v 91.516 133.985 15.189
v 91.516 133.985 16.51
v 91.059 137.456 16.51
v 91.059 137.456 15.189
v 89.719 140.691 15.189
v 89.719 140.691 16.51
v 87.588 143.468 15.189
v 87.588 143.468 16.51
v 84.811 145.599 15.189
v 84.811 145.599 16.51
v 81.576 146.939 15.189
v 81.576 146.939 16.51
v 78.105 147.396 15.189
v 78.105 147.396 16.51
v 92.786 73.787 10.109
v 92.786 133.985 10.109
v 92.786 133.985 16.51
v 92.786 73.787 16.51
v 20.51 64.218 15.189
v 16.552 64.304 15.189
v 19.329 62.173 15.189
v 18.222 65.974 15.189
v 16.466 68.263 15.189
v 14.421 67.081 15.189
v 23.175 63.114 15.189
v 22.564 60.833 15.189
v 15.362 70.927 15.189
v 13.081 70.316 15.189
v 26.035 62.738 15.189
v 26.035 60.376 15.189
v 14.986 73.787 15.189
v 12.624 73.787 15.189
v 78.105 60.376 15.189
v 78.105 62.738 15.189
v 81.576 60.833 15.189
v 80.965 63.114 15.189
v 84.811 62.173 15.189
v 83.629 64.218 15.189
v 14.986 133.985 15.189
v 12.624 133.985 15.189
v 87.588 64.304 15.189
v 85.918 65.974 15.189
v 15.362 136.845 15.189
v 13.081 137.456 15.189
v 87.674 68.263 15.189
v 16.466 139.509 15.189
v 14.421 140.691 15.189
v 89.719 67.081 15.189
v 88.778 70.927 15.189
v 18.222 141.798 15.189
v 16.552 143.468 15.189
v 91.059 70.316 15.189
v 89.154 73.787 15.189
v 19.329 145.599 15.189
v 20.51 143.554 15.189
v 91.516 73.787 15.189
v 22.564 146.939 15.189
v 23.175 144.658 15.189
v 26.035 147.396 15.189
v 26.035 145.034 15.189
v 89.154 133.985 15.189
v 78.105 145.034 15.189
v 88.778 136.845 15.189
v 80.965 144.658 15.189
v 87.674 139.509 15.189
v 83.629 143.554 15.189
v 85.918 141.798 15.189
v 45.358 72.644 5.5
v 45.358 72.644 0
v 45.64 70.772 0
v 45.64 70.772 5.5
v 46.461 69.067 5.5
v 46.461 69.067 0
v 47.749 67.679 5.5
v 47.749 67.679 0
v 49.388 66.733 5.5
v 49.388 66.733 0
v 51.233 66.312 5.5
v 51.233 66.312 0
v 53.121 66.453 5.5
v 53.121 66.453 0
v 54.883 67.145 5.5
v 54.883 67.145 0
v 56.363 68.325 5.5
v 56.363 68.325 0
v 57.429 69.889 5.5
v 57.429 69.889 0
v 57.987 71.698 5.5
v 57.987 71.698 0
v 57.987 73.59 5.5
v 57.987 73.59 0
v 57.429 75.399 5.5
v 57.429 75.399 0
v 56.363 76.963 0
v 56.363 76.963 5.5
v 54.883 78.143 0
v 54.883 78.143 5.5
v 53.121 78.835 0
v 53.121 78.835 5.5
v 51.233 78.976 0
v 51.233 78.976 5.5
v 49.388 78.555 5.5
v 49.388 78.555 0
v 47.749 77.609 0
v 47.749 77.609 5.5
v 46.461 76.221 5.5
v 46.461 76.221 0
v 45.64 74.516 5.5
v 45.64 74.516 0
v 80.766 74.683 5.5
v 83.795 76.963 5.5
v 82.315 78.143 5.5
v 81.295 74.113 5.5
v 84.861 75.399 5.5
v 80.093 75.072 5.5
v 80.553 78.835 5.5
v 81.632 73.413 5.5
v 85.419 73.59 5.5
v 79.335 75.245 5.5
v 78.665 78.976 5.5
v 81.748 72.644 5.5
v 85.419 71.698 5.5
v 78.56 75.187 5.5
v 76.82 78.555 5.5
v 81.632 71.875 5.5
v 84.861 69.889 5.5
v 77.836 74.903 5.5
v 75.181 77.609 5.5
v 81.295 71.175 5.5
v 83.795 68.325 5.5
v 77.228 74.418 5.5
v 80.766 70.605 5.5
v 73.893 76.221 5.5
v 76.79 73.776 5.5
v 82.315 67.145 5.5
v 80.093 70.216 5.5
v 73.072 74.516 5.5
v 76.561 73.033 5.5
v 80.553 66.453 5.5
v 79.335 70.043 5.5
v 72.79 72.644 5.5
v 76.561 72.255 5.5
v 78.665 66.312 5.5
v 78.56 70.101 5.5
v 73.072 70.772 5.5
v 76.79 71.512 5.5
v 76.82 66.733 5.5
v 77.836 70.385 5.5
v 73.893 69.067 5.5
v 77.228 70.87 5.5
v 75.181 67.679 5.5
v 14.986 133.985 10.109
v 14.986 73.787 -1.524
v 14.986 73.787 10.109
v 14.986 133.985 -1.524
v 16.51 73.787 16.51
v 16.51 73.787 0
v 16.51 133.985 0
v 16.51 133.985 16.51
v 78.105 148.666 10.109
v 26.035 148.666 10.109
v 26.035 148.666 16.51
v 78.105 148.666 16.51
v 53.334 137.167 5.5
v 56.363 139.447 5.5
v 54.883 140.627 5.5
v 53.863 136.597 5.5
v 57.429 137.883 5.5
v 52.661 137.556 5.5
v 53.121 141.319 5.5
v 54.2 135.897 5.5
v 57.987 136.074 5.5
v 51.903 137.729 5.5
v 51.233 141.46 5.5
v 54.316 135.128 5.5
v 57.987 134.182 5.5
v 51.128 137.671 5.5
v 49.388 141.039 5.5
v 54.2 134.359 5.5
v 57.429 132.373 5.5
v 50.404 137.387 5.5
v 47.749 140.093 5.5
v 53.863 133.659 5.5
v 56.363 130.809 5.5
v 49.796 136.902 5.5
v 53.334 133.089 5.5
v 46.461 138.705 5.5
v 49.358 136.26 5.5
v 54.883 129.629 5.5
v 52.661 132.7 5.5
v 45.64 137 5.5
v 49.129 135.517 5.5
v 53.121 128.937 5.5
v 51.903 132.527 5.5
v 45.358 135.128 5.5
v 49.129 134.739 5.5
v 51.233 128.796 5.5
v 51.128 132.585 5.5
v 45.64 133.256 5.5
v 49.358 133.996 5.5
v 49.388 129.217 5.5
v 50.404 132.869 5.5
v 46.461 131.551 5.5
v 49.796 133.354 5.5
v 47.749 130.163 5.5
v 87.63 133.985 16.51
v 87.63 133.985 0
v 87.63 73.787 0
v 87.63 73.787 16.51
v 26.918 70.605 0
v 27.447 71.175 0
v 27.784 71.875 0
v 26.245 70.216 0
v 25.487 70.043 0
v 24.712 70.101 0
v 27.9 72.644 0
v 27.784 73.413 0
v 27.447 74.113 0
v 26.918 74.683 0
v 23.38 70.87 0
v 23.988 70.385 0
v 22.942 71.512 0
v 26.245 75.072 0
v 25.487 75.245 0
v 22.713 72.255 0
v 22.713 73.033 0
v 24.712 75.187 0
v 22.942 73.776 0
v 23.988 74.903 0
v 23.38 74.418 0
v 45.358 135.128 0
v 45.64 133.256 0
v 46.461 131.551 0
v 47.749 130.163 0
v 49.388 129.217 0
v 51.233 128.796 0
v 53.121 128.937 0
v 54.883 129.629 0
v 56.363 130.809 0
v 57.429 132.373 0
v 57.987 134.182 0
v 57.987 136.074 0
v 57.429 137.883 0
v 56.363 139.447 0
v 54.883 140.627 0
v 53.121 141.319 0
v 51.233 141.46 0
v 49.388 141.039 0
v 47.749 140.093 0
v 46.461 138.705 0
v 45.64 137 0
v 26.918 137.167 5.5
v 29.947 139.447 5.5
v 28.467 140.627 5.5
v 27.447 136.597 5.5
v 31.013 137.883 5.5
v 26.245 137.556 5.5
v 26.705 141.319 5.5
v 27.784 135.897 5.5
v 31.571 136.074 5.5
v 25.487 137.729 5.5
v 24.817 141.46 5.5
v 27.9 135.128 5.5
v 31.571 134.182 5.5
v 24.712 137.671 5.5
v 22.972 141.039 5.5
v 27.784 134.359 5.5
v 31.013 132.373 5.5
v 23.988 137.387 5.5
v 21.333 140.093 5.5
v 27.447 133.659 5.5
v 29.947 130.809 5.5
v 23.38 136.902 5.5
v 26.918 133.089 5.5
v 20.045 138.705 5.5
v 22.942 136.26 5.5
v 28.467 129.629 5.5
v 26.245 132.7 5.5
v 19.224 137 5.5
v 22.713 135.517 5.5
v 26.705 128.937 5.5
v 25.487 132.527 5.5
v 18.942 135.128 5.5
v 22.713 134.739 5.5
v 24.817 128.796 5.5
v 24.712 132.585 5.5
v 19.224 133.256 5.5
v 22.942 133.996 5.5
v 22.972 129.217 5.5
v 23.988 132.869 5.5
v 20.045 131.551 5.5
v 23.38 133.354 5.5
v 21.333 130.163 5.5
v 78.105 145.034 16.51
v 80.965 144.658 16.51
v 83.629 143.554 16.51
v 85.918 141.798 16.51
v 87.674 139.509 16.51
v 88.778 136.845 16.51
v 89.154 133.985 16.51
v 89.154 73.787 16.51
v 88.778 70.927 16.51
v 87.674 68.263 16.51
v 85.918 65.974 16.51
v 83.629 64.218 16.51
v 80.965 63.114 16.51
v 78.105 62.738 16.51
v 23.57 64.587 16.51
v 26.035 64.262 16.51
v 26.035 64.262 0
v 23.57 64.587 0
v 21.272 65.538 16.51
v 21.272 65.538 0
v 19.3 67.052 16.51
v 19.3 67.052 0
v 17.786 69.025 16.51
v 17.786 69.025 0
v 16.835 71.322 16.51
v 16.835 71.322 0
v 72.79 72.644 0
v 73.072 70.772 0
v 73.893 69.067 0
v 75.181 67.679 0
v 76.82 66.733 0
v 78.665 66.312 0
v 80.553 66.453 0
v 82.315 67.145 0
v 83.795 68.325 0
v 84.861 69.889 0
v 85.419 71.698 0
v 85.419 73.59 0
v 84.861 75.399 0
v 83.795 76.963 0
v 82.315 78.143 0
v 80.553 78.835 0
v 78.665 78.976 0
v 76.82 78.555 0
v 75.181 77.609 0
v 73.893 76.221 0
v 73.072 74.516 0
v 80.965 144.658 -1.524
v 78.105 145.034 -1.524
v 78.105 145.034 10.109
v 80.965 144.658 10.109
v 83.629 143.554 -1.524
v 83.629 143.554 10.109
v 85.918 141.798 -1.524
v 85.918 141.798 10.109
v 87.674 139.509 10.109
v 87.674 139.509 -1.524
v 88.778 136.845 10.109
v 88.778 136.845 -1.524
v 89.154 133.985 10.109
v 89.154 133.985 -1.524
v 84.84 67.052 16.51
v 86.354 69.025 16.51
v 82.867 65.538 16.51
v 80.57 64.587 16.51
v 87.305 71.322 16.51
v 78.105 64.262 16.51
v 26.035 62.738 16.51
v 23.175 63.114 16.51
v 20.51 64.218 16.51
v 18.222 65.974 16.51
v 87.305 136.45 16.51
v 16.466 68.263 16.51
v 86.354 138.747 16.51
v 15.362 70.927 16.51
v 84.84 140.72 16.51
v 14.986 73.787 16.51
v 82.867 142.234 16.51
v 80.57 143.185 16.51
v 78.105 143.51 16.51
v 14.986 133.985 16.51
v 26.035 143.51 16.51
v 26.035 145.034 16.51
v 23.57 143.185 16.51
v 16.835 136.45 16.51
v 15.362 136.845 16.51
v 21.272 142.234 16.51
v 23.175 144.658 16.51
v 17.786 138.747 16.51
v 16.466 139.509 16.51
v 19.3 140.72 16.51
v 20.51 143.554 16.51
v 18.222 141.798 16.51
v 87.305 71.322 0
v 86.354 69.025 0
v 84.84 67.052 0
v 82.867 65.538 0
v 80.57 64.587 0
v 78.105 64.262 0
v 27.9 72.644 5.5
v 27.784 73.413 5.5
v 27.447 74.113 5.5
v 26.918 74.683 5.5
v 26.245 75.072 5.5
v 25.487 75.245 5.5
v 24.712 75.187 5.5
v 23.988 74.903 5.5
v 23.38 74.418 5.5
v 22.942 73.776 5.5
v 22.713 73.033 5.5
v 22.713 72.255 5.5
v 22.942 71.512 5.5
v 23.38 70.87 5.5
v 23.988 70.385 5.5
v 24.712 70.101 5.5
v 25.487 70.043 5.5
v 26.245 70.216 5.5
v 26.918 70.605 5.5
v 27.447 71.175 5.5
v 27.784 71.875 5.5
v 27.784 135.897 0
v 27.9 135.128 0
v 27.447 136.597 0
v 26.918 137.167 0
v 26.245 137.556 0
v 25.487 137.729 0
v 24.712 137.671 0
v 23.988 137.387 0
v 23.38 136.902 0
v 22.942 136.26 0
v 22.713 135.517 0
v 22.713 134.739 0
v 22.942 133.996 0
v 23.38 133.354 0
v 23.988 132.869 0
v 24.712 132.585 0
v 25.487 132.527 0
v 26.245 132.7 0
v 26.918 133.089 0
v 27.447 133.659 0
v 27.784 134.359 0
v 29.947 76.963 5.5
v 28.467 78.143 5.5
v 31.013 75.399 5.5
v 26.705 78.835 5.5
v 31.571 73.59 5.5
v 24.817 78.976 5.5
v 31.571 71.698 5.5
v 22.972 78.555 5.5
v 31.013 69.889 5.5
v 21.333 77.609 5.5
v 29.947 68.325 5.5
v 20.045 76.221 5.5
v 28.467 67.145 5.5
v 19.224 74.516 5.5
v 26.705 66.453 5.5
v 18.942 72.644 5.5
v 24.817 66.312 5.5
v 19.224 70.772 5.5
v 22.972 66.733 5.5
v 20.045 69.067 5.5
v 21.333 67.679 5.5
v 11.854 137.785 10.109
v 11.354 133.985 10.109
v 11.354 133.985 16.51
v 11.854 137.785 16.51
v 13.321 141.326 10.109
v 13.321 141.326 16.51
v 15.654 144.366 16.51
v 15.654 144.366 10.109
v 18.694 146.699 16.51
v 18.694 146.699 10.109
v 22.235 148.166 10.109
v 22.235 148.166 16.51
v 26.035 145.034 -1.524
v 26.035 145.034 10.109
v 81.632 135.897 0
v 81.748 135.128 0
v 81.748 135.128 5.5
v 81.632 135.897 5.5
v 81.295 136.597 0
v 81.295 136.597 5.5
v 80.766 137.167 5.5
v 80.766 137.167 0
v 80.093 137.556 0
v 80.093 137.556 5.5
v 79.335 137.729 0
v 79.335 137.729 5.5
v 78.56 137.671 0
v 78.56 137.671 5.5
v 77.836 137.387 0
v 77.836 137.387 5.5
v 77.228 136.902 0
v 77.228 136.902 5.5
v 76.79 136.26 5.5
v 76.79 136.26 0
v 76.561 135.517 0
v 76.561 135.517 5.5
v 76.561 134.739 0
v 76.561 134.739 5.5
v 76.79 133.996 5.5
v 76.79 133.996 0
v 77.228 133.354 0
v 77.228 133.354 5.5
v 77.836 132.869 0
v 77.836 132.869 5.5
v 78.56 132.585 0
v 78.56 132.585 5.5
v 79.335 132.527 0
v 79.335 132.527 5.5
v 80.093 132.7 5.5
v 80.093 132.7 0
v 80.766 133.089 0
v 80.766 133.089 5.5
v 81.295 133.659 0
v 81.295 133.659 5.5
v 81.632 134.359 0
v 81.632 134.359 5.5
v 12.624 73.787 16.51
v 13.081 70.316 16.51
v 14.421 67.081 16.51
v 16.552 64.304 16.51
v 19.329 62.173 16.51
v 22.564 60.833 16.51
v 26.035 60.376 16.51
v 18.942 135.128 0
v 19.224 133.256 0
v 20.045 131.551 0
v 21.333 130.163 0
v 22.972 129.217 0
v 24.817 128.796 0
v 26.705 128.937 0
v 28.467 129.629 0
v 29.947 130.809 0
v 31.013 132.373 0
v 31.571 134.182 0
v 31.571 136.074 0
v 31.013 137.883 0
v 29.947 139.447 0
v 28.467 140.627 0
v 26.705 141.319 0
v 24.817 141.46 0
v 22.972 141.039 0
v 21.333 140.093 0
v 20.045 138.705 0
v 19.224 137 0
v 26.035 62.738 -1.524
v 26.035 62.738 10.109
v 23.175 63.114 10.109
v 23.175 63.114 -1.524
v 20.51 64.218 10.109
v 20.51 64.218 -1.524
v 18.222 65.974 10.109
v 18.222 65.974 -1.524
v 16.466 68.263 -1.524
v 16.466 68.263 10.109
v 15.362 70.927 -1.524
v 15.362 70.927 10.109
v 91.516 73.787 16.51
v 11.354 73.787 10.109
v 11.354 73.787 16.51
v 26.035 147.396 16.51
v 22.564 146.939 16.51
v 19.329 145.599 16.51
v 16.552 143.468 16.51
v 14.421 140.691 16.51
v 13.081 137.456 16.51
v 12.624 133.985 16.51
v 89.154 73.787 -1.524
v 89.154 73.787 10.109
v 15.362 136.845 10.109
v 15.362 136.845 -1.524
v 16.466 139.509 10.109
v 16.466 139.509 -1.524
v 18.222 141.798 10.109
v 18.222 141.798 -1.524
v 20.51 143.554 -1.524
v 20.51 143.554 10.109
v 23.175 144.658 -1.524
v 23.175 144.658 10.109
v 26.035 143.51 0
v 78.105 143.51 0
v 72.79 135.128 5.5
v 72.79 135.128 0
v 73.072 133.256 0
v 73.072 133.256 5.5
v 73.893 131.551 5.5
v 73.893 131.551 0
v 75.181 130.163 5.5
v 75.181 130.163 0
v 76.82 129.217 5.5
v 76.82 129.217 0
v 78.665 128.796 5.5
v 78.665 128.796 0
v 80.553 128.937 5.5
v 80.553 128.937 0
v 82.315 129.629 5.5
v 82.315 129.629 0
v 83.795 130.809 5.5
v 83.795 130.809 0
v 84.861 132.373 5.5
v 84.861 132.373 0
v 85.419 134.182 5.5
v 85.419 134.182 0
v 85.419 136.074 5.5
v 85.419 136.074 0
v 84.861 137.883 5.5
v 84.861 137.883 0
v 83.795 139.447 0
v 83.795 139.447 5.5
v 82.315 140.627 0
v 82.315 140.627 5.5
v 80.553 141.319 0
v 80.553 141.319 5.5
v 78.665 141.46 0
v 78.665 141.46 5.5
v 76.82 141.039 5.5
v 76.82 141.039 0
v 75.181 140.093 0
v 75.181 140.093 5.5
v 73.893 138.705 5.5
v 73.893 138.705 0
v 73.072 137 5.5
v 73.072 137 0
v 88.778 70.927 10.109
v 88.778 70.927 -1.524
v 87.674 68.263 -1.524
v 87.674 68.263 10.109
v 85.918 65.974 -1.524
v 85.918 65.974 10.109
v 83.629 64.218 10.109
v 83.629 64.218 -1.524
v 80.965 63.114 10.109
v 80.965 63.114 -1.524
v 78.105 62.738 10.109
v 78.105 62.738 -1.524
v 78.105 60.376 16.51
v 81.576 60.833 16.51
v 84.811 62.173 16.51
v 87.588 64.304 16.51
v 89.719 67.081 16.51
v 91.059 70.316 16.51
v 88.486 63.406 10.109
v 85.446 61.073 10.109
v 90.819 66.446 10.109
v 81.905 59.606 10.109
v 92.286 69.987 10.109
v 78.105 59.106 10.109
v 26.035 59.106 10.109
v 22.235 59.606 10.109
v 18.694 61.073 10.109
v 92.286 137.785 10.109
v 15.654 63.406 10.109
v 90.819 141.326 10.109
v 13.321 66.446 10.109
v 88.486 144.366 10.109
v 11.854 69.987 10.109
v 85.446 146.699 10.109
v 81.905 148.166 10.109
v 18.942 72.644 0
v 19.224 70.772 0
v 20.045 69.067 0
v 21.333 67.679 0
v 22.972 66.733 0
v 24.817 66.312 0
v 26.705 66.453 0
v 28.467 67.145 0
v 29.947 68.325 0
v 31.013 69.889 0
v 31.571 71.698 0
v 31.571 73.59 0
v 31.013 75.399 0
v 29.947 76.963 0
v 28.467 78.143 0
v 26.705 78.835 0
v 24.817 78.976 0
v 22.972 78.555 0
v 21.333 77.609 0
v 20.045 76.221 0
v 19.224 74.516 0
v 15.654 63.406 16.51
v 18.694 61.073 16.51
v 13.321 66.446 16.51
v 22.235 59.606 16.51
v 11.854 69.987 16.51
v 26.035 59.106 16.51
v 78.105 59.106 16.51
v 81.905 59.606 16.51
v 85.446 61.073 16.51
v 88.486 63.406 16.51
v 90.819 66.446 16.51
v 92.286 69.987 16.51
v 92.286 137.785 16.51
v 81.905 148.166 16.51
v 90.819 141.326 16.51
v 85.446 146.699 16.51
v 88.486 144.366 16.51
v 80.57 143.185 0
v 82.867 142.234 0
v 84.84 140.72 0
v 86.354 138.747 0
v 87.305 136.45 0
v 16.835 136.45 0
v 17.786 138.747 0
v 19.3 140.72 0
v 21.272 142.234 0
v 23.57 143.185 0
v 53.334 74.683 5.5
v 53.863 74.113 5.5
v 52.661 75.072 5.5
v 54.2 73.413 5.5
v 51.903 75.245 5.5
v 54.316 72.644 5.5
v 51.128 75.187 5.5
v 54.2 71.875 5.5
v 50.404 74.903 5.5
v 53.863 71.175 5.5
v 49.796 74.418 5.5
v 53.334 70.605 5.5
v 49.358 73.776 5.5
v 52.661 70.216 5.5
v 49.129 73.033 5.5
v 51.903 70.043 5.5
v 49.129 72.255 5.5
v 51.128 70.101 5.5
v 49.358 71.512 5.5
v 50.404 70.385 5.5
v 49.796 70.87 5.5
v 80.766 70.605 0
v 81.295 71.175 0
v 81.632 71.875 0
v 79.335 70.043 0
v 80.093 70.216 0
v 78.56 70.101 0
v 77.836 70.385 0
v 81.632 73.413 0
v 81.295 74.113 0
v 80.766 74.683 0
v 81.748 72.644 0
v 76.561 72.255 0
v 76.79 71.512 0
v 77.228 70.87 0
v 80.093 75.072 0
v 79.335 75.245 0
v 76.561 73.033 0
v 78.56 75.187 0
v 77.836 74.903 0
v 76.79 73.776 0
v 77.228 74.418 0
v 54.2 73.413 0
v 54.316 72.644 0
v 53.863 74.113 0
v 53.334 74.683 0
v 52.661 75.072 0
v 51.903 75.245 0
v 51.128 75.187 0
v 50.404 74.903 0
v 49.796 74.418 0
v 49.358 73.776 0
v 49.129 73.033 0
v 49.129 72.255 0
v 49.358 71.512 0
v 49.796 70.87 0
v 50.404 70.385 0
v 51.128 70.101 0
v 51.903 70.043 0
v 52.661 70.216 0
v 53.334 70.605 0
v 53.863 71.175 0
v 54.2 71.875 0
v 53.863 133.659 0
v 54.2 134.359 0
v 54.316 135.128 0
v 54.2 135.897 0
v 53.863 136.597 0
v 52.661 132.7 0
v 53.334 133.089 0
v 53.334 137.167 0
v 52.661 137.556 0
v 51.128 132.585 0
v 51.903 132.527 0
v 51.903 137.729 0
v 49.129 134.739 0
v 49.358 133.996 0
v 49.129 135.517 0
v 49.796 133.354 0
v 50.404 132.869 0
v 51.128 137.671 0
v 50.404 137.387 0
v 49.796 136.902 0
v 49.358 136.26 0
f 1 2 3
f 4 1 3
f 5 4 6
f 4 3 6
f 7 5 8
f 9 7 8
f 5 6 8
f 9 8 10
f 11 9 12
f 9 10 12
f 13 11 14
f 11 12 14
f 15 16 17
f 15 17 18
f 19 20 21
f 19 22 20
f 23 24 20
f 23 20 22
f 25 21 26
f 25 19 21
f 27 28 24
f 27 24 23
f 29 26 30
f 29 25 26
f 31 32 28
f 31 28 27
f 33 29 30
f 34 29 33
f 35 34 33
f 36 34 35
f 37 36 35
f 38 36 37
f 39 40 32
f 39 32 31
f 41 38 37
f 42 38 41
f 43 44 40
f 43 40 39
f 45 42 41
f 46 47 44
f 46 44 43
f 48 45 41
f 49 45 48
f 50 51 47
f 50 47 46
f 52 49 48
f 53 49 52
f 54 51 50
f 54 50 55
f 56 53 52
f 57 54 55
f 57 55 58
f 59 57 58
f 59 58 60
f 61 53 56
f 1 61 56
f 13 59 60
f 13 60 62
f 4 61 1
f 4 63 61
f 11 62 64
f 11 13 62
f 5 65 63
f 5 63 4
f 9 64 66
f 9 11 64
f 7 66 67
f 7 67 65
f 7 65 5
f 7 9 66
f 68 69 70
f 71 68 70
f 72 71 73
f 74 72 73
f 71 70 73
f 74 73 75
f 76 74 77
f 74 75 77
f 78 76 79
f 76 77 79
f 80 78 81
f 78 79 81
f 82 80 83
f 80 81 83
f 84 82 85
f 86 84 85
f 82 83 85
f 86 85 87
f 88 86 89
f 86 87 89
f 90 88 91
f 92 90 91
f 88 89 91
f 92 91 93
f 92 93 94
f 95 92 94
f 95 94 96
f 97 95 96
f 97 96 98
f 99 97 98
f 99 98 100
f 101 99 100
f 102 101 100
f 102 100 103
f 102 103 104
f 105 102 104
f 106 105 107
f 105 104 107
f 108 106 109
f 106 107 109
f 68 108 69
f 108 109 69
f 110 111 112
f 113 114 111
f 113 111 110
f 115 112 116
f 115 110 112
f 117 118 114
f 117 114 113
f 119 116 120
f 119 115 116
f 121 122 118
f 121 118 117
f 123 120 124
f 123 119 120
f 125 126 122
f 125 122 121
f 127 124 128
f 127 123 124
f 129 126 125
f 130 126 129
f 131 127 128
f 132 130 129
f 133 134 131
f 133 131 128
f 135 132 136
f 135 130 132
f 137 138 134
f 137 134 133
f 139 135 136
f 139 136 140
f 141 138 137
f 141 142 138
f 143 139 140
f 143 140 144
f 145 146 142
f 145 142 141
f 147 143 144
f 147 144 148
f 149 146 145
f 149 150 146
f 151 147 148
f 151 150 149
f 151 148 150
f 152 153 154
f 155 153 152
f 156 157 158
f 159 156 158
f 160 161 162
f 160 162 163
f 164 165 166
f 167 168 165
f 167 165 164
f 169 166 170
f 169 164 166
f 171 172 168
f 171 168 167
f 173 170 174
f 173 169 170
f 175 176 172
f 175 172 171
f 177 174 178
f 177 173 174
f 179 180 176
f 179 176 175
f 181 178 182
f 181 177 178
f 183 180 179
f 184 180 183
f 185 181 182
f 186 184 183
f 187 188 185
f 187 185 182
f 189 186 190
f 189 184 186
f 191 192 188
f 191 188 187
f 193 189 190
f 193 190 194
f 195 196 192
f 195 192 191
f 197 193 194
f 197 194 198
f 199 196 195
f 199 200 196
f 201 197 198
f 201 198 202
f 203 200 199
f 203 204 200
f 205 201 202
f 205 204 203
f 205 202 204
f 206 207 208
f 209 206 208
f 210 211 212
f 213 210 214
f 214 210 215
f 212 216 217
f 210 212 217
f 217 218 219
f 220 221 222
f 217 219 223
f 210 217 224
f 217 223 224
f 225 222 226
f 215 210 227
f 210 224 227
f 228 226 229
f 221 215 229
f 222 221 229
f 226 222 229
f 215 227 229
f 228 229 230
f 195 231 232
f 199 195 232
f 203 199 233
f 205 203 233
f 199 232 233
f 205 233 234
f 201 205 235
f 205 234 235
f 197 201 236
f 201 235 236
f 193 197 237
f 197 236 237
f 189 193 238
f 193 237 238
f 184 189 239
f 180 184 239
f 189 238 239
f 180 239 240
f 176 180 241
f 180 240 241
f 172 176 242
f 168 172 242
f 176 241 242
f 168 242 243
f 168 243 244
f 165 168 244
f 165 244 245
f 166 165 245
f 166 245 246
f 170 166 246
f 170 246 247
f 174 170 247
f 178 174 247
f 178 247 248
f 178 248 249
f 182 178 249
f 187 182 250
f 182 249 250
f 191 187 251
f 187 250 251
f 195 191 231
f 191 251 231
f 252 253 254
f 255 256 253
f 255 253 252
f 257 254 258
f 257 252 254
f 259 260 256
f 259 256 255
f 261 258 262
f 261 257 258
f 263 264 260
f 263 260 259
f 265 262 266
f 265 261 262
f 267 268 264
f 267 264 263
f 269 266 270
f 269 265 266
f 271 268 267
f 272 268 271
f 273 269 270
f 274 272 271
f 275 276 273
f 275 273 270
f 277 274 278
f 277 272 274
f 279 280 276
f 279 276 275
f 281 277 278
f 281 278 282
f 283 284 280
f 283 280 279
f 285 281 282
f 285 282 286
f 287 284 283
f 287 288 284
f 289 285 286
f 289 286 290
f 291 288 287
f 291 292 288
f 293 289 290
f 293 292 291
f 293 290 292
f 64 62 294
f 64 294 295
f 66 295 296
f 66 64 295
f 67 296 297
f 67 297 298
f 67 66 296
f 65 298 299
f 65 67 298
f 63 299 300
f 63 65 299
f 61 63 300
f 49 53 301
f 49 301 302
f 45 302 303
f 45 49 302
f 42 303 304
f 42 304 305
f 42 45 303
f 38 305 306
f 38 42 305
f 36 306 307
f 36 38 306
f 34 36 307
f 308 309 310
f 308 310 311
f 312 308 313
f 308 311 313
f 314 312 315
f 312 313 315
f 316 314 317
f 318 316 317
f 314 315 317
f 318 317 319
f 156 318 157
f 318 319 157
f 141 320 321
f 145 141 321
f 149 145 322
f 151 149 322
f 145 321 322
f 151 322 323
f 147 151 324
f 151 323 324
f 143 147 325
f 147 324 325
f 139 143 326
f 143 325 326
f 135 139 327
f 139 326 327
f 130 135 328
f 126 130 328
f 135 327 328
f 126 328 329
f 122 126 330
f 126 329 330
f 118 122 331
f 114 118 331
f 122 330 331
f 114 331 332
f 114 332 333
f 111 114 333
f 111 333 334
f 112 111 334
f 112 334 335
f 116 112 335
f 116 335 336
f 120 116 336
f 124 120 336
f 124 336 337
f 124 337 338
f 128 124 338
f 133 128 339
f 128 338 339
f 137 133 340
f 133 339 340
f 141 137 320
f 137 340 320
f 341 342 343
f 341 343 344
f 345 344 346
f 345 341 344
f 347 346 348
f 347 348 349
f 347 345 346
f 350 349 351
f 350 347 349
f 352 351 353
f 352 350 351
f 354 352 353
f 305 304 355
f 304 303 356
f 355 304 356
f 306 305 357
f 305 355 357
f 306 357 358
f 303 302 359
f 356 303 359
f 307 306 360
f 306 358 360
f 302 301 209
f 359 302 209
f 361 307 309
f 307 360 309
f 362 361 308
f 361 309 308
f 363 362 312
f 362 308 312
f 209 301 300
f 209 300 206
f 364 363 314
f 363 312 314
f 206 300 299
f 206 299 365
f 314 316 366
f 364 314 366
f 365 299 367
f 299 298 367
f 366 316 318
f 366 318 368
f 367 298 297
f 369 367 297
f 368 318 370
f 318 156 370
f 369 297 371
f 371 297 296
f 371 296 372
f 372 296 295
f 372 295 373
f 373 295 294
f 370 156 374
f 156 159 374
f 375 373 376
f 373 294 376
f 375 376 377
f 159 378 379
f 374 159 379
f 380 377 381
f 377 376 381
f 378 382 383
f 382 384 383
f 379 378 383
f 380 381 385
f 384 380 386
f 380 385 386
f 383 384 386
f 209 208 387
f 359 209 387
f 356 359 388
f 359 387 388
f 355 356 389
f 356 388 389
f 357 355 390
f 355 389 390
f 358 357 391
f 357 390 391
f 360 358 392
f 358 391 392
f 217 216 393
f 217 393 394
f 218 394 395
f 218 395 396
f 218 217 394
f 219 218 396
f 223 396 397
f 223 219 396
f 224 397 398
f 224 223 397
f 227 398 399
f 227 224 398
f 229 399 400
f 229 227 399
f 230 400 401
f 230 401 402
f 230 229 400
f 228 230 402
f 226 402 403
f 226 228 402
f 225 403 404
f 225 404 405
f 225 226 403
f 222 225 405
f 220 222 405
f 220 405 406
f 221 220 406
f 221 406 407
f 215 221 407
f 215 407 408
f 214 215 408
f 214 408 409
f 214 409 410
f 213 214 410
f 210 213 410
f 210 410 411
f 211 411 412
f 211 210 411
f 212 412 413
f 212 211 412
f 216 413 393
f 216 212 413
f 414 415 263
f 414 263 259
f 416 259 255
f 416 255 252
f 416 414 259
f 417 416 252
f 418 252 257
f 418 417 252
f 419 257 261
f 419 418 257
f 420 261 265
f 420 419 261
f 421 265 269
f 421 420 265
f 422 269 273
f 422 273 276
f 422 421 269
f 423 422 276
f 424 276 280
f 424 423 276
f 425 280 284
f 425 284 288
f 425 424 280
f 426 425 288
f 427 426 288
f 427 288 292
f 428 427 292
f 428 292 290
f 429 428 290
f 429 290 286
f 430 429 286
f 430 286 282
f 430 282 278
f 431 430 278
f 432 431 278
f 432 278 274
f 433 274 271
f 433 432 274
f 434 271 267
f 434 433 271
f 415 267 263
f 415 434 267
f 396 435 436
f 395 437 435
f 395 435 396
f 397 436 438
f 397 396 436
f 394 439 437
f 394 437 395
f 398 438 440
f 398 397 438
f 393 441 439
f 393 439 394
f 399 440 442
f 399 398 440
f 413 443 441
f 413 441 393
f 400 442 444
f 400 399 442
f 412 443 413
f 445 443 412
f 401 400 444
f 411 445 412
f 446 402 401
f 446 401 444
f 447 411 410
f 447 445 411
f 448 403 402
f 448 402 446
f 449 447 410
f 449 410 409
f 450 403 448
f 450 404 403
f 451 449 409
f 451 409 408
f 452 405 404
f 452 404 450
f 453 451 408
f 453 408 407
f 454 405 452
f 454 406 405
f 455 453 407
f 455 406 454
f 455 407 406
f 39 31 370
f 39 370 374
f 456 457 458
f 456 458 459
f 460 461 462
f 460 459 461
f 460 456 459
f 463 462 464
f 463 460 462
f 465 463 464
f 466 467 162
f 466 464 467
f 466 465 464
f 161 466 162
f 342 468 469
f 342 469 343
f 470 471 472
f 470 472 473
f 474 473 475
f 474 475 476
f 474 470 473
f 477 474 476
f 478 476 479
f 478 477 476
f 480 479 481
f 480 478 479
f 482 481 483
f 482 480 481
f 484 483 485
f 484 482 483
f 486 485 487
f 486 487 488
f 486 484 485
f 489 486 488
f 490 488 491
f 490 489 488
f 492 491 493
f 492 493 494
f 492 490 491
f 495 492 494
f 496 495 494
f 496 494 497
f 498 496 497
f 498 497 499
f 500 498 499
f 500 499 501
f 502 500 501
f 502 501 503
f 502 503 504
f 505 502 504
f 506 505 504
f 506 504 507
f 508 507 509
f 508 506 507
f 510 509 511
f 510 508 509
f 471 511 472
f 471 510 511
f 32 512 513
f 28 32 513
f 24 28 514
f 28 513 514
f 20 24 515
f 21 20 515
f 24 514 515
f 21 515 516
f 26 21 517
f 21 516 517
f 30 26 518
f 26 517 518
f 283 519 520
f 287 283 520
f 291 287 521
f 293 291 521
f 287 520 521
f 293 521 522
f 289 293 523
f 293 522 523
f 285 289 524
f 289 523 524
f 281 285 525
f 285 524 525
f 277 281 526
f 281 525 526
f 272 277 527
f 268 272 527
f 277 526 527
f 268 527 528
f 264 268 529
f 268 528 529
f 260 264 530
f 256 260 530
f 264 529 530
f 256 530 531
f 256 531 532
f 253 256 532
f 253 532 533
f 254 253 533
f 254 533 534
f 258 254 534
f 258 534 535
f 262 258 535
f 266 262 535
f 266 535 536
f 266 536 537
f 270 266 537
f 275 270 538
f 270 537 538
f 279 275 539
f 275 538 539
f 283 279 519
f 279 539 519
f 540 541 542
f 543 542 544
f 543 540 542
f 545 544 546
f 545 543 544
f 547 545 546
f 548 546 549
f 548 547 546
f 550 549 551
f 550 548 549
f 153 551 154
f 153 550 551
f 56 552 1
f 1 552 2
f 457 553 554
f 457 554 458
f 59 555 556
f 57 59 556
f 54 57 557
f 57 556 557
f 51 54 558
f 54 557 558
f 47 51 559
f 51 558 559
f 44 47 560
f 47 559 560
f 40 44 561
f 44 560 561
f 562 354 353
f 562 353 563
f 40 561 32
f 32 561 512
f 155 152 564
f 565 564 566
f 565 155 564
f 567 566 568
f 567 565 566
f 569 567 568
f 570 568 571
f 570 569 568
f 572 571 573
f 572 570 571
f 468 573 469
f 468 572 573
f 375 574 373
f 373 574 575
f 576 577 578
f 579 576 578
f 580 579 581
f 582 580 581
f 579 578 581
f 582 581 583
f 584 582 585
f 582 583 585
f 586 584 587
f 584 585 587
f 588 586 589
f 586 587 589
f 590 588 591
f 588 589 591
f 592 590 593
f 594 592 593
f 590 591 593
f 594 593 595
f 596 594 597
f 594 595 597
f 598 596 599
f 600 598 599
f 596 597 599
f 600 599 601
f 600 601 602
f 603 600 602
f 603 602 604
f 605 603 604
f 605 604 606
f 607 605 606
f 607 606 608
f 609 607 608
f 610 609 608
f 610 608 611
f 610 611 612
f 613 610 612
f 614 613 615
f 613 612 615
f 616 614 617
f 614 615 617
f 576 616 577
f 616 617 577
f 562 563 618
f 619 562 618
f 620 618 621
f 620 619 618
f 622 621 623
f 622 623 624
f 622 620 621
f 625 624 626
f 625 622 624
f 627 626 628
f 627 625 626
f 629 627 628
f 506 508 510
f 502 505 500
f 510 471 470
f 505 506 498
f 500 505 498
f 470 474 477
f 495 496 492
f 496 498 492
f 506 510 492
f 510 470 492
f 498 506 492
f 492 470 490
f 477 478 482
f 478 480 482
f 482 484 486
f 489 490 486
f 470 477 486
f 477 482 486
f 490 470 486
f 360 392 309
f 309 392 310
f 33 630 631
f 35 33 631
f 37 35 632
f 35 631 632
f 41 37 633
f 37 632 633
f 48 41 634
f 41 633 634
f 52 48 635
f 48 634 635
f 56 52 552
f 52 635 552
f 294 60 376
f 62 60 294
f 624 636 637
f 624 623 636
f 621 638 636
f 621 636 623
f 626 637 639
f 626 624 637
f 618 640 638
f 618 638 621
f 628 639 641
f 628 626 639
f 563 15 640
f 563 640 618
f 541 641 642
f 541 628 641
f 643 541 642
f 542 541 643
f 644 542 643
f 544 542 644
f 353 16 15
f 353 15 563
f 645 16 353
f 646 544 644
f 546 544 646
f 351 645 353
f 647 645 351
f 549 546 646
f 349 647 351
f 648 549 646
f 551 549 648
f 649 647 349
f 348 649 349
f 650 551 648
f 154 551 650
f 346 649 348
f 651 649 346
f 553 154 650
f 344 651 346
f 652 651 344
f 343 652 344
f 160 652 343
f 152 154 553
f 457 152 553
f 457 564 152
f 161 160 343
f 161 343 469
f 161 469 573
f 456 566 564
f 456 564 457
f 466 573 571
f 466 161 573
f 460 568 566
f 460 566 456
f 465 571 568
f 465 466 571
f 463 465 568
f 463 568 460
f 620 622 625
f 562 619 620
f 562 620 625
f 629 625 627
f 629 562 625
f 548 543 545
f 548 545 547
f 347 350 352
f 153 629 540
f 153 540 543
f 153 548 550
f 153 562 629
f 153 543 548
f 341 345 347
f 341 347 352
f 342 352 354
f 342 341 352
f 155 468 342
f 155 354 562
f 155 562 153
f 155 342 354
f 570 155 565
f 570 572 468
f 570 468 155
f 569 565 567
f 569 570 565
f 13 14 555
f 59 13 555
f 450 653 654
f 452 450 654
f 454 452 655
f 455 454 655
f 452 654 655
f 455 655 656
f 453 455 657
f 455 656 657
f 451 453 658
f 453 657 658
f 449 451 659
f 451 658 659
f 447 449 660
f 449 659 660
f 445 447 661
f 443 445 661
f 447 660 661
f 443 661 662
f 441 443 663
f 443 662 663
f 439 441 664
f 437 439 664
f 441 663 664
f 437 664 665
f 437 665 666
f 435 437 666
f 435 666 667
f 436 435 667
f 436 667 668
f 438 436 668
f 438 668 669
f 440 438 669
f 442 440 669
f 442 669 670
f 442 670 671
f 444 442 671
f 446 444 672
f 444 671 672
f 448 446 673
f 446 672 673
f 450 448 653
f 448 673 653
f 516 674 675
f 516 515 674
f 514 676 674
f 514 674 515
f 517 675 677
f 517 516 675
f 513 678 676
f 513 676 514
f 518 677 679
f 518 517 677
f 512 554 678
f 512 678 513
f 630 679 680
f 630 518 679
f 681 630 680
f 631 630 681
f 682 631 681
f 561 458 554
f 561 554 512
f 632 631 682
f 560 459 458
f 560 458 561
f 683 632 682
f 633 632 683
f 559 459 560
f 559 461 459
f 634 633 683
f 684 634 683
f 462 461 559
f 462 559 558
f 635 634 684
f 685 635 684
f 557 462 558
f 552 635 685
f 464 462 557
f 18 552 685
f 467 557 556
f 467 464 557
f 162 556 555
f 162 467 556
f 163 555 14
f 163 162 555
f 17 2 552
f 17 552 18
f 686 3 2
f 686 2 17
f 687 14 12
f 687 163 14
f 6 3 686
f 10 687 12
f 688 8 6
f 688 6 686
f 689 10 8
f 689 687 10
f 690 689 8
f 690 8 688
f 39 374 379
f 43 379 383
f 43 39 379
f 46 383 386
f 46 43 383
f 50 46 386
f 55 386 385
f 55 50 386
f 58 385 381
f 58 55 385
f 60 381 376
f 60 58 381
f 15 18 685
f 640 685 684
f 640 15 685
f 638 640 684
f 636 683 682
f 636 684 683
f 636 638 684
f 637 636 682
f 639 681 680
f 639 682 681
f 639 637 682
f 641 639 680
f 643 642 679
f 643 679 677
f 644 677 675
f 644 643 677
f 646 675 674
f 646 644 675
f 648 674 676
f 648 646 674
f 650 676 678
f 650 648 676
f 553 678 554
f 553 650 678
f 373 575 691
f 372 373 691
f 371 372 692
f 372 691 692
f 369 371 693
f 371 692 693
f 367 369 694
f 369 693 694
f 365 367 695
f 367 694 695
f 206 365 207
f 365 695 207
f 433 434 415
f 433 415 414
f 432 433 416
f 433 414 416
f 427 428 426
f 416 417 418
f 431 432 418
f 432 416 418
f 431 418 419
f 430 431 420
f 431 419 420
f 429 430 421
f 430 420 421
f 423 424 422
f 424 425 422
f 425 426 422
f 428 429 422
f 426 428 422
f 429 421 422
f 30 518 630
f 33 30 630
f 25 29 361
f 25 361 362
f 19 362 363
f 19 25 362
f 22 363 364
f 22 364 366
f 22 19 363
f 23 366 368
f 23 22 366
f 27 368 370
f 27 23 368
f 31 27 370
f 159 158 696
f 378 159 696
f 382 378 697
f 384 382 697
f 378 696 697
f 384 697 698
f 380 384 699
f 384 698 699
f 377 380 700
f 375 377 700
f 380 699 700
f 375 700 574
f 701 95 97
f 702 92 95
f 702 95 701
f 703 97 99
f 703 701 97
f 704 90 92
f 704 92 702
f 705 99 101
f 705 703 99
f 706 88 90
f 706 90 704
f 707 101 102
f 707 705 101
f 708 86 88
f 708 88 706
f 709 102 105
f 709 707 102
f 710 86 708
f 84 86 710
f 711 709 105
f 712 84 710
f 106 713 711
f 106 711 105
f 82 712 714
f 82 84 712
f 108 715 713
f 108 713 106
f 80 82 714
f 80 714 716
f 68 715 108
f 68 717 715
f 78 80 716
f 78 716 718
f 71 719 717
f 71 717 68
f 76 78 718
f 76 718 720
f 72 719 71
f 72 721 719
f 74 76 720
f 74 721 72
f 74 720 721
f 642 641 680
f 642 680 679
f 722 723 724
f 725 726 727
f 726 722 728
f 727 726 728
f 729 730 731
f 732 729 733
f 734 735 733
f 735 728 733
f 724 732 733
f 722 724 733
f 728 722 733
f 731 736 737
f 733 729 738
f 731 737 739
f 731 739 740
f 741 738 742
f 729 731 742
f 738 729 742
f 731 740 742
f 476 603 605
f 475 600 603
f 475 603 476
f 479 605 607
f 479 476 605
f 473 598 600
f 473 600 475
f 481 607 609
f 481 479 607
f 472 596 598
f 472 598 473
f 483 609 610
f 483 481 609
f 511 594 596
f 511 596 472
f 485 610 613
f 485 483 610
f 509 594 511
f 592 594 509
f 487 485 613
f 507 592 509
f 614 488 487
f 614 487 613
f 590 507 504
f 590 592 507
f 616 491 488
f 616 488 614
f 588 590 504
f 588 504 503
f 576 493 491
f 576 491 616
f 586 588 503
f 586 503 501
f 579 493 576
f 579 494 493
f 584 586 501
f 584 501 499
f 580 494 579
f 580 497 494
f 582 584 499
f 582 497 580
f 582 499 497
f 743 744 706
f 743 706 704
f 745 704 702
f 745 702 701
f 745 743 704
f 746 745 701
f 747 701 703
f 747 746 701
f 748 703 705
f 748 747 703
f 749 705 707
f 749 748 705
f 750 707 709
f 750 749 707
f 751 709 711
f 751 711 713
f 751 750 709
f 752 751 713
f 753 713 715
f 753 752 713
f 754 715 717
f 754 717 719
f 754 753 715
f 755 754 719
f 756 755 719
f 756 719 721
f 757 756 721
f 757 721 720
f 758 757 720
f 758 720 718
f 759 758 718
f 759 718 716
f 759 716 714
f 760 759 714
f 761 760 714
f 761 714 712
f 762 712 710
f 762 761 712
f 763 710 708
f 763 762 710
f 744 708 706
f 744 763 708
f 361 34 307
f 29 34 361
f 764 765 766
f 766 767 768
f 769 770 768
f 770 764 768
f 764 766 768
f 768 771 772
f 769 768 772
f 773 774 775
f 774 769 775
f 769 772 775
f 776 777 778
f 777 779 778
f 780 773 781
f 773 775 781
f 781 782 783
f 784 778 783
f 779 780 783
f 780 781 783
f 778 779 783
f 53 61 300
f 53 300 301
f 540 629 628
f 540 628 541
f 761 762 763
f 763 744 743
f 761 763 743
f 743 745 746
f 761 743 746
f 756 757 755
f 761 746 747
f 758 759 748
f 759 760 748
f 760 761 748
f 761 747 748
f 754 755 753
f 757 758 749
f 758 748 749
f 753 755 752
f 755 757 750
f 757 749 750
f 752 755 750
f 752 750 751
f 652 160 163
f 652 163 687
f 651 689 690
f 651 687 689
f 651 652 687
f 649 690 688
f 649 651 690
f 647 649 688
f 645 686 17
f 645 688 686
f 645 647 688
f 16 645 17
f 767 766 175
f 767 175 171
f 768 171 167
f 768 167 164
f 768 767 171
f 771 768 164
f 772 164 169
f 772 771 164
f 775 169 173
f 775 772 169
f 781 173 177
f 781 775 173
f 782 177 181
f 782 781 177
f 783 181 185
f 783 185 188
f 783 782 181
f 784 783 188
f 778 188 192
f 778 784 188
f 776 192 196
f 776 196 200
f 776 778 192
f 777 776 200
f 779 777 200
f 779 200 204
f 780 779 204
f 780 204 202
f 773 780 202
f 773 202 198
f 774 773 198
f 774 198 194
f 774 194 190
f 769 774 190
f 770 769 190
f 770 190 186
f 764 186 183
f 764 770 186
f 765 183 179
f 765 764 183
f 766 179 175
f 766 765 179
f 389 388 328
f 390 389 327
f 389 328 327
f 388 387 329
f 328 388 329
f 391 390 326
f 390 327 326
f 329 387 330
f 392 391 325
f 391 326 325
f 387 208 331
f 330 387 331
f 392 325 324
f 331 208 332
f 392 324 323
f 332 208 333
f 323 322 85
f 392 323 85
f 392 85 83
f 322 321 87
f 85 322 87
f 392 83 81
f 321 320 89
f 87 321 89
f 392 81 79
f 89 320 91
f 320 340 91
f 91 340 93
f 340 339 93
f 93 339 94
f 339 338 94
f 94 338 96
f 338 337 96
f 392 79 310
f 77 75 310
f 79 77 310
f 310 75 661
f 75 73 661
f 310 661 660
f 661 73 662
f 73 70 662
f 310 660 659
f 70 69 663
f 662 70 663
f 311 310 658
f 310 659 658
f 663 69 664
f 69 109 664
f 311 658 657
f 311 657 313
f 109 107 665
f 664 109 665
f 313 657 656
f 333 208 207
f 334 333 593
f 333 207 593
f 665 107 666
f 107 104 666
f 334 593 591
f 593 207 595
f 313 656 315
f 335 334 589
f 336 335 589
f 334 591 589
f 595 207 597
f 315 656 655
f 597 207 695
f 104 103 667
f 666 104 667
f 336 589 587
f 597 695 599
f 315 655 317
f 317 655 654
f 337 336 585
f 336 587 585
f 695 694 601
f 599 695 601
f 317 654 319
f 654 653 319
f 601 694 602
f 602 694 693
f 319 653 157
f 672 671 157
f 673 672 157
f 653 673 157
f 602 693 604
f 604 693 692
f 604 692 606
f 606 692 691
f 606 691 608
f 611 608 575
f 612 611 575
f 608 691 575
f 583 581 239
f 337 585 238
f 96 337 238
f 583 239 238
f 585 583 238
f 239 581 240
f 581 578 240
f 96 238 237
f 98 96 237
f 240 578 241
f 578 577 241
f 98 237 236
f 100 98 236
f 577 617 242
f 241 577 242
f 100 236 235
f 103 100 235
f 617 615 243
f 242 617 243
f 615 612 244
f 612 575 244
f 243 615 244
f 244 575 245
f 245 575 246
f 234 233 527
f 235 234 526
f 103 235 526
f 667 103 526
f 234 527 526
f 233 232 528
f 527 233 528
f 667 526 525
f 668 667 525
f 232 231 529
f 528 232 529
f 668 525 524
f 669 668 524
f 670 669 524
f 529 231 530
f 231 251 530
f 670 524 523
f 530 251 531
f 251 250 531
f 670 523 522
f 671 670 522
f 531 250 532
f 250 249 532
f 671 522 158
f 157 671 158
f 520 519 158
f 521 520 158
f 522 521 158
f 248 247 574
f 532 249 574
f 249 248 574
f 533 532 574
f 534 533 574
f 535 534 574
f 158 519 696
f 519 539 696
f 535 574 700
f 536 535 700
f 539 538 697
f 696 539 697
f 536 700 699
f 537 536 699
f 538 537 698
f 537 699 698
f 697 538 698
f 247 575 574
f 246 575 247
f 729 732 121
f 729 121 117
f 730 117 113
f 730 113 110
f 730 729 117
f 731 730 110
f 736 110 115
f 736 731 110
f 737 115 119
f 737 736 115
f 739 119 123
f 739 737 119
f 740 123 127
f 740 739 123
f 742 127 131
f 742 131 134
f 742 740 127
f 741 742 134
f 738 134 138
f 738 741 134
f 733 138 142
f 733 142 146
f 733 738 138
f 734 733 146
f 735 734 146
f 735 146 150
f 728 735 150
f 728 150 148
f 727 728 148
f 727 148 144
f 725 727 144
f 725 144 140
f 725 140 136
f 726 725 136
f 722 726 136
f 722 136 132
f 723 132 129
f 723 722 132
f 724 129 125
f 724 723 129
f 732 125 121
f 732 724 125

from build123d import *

# Parameters (mm, degrees)
BOSS_EXTRUDE1_DEPTH  = 16.51
SHELL1_T             = 1.524
SKETCH2_R            = 6.35
SKETCH2_R_2          = 2.608000118
BOSS_EXTRUDE2_DEPTH  = 5.5
BOSS_EXTRUDE9_DEPTH  = 1.3208
BOSS_EXTRUDE10_START = 5.08
BOSS_EXTRUDE10_DEPTH = 5.08


with BuildPart() as part:
    # Sketch1 → Boss-Extrude1 (new body)
    with BuildSketch(Plane.XY):
        with BuildLine():
            Line((26.034999985, 143.509994751), (78.104997498, 143.509994751))
            ThreePointArc((78.104997498, 143.509994751), (84.840189588, 140.720186842), (87.629997498, 133.984994751))
            Line((87.629997498, 133.984994751), (87.629997498, 73.787000793))
            ThreePointArc((87.629997498, 73.787000793), (84.840189588, 67.051808703), (78.104997498, 64.262000793))
            Line((78.104997498, 64.262000793), (26.034999985, 64.262000793))
            ThreePointArc((26.034999985, 64.262000793), (19.299807894, 67.051808703), (16.509999985, 73.787000793))
            Line((16.509999985, 73.787000793), (16.509999985, 133.984994751))
            ThreePointArc((16.509999985, 133.984994751), (19.299807894, 140.720186842), (26.034999985, 143.509994751))
        make_face()
    extrude(amount=BOSS_EXTRUDE1_DEPTH)

    # Shell1
    shell1_openings = [part.faces().sort_by_distance(p)[0] for p in [
        (52.069998741, 103.885997772, 16.51),
    ]]
    offset(amount=SHELL1_T, openings=shell1_openings, kind=Kind.INTERSECTION)

    # Sketch2 → Boss-Extrude2 (add)
    # profile 1 of 6: a face of its own
    with BuildSketch(Plane.XY):
        with Locations(Location((25.292, 135.128, 0), (0, 0, 180))):
            Circle(SKETCH2_R)
        with Locations((25.292, 135.128)):
            Circle(SKETCH2_R_2, mode=Mode.SUBTRACT)
    # profile 2 of 6: a face of its own
    with BuildSketch(Plane.XY):
        with Locations(Location((51.708, 135.128, 0), (0, 0, 180))):
            Circle(SKETCH2_R)
        with Locations((51.708, 135.128)):
            Circle(SKETCH2_R_2, mode=Mode.SUBTRACT)
    # profile 3 of 6: a face of its own
    with BuildSketch(Plane.XY):
        with Locations(Location((79.14, 135.128, 0), (0, 0, 180))):
            Circle(SKETCH2_R)
        with Locations((79.14, 135.128)):
            Circle(SKETCH2_R_2, mode=Mode.SUBTRACT)
    # profile 4 of 6: a face of its own
    with BuildSketch(Plane.XY):
        with Locations(Location((25.292, 72.644, 0), (0, 0, 180))):
            Circle(SKETCH2_R)
        with Locations((25.292, 72.644)):
            Circle(SKETCH2_R_2, mode=Mode.SUBTRACT)
    # profile 5 of 6: a face of its own
    with BuildSketch(Plane.XY):
        with Locations(Location((51.708, 72.644, 0), (0, 0, 180))):
            Circle(SKETCH2_R)
        with Locations((51.708, 72.644)):
            Circle(SKETCH2_R_2, mode=Mode.SUBTRACT)
    # profile 6 of 6: a face of its own
    with BuildSketch(Plane.XY):
        with Locations(Location((79.14, 72.644, 0), (0, 0, 180))):
            Circle(SKETCH2_R)
        with Locations((79.14, 72.644)):
            Circle(SKETCH2_R_2, mode=Mode.SUBTRACT)
    extrude(amount=BOSS_EXTRUDE2_DEPTH)



with BuildPart() as body_2:
    # Sketch7 → Boss-Extrude9 (new body)
    with BuildSketch(Plane.XY.offset(16.51)):
        with BuildLine():
            Line((92.786197498, 73.787000793), (92.786197498, 133.984994751))
            ThreePointArc((92.786197498, 133.984994751), (88.486173574, 144.366170827), (78.104997498, 148.666194751))
            Line((78.104997498, 148.666194751), (26.034999985, 148.666194751))
            ThreePointArc((26.034999985, 148.666194751), (15.653823909, 144.366170827), (11.353799985, 133.984994751))
            Line((11.353799985, 133.984994751), (11.353799985, 73.787000793))
            ThreePointArc((11.353799985, 73.787000793), (15.653823909, 63.405824718), (26.034999985, 59.105800793))
            Line((26.034999985, 59.105800793), (78.104997498, 59.105800793))
            ThreePointArc((78.104997498, 59.105800793), (88.486173574, 63.405824718), (92.786197498, 73.787000793))
        make_face()
        with BuildLine():
            ThreePointArc((26.034999985, 147.396194751), (16.551849521, 143.468145215), (12.623799985, 133.984994751))
            Line((12.623799985, 133.984994751), (12.623799985, 73.787000793))
            ThreePointArc((12.623799985, 73.787000793), (16.551849521, 64.30385033), (26.034999985, 60.375800793))
            Line((26.034999985, 60.375800793), (78.104997498, 60.375800793))
            ThreePointArc((78.104997498, 60.375800793), (87.588147961, 64.30385033), (91.516197498, 73.787000793))
            Line((91.516197498, 73.787000793), (91.516197498, 133.984994751))
            ThreePointArc((91.516197498, 133.984994751), (87.588147961, 143.468145215), (78.104997498, 147.396194751))
            Line((78.104997498, 147.396194751), (26.034999985, 147.396194751))
        make_face(mode=Mode.SUBTRACT)
    extrude(amount=-BOSS_EXTRUDE9_DEPTH)


with BuildPart() as part_1:
    add(part.part)

    add(body_2.part)  # Boss-Extrude10 merges body 2
    # Sketch8 → Boss-Extrude10 (add)
    # profile 1 of 2: a face of its own
    with BuildSketch(Plane(origin=(0, 0, 15.1892), x_dir=(-1, 0, 0), z_dir=(0, 0, -1)).offset(BOSS_EXTRUDE10_START)):
        with BuildLine():
            ThreePointArc((-78.104997498, 148.666194751), (-88.486173574, 144.366170827), (-92.786197498, 133.984994751))
            Line((-92.786197498, 133.984994751), (-92.786197498, 73.787000793))
            ThreePointArc((-92.786197498, 73.787000793), (-88.486173574, 63.405824718), (-78.104997498, 59.105800793))
            Line((-78.104997498, 59.105800793), (-26.034999985, 59.105800793))
            ThreePointArc((-26.034999985, 59.105800793), (-15.653823909, 63.405824718), (-11.353799985, 73.787000793))
            Line((-11.353799985, 73.787000793), (-11.353799985, 133.984994751))
            ThreePointArc((-11.353799985, 133.984994751), (-15.653823909, 144.366170827), (-26.034999985, 148.666194751))
            Line((-26.034999985, 148.666194751), (-78.104997498, 148.666194751))
        make_face()
        with BuildLine():
            Line((-78.104997498, 147.396194751), (-26.034999985, 147.396194751))
            ThreePointArc((-26.034999985, 147.396194751), (-16.551849521, 143.468145215), (-12.623799985, 133.984994751))
            Line((-12.623799985, 133.984994751), (-12.623799985, 73.787000793))
            ThreePointArc((-12.623799985, 73.787000793), (-16.551849521, 64.30385033), (-26.034999985, 60.375800793))
            Line((-26.034999985, 60.375800793), (-78.104997498, 60.375800793))
            ThreePointArc((-78.104997498, 60.375800793), (-87.588147961, 64.30385033), (-91.516197498, 73.787000793))
            Line((-91.516197498, 73.787000793), (-91.516197498, 133.984994751))
            ThreePointArc((-91.516197498, 133.984994751), (-87.588147961, 143.468145215), (-78.104997498, 147.396194751))
        make_face(mode=Mode.SUBTRACT)
    # profile 2 of 2: a face of its own
    with BuildSketch(Plane(origin=(0, 0, 15.1892), x_dir=(-1, 0, 0), z_dir=(0, 0, -1)).offset(BOSS_EXTRUDE10_START)):
        with BuildLine():
            ThreePointArc((-26.034999985, 147.396194751), (-16.551849521, 143.468145215), (-12.623799985, 133.984994751))
            Line((-12.623799985, 133.984994751), (-12.623799985, 73.787000793))
            ThreePointArc((-12.623799985, 73.787000793), (-16.551849521, 64.30385033), (-26.034999985, 60.375800793))
            Line((-26.034999985, 60.375800793), (-78.104997498, 60.375800793))
            ThreePointArc((-78.104997498, 60.375800793), (-87.588147961, 64.30385033), (-91.516197498, 73.787000793))
            Line((-91.516197498, 73.787000793), (-91.516197498, 133.984994751))
            ThreePointArc((-91.516197498, 133.984994751), (-87.588147961, 143.468145215), (-78.104997498, 147.396194751))
            Line((-78.104997498, 147.396194751), (-26.034999985, 147.396194751))
        make_face()
        with BuildLine():
            ThreePointArc((-26.034999985, 62.738000793), (-18.222177159, 65.974177968), (-14.985999985, 73.787000793))
            Line((-14.985999985, 73.787000793), (-14.985999985, 133.984994751))
            ThreePointArc((-14.985999985, 133.984994751), (-18.222177159, 141.797817576), (-26.034999985, 145.033994751))
            Line((-26.034999985, 145.033994751), (-78.104997498, 145.033994751))
            ThreePointArc((-78.104997498, 145.033994751), (-85.917820323, 141.797817576), (-89.153997498, 133.984994751))
            Line((-89.153997498, 133.984994751), (-89.153997498, 73.787000793))
            ThreePointArc((-89.153997498, 73.787000793), (-85.917820323, 65.974177968), (-78.104997498, 62.738000793))
            Line((-78.104997498, 62.738000793), (-26.034999985, 62.738000793))
        make_face(mode=Mode.SUBTRACT)
    extrude(amount=-BOSS_EXTRUDE10_DEPTH)


solid = part_1.part
